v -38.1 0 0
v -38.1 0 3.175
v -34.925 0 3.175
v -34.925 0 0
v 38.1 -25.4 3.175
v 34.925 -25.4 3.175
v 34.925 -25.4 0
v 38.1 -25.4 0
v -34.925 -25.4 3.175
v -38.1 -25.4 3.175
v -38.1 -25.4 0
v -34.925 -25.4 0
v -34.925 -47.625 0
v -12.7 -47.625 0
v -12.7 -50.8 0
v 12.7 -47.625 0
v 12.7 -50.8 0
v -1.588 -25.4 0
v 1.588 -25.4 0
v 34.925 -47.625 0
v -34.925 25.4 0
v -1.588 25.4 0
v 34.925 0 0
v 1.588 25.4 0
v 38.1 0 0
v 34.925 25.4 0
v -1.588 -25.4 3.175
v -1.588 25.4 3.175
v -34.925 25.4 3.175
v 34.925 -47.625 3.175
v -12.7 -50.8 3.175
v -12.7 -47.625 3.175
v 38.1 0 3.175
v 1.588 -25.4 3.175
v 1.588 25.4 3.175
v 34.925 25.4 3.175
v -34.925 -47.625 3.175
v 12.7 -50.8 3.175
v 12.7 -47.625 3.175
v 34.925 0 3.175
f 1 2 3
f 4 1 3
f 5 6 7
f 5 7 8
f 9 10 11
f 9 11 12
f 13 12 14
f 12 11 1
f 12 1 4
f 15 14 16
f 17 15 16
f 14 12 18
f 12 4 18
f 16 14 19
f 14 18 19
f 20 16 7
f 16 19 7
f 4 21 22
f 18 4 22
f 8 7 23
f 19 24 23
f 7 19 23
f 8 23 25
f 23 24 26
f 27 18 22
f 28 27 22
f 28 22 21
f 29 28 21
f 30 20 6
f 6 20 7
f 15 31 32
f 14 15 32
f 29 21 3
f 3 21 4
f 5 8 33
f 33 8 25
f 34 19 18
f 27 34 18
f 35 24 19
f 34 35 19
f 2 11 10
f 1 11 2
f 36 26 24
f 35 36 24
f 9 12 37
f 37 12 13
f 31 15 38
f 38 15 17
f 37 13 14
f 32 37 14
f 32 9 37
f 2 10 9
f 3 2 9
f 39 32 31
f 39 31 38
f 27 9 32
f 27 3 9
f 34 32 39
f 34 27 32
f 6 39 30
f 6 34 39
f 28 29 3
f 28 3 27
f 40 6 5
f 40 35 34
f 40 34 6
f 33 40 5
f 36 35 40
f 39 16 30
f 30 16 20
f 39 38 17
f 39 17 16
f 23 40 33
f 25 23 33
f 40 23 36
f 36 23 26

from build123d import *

# Parameters (mm, degrees)
F0_W     = 3.175
F0_H     = 25.4
F0_W_2   = 25.4
F0_H_2   = 3.175
F1_DEPTH = 3.175


with BuildPart() as f1:
    # F0 (on Top) → F1 (new body)
    with BuildSketch(Plane.XY):
        Polygon((34.925, -47.625), (34.925, -25.4), (1.5875, -25.4), (-1.5875, -25.4), (-34.925, -25.4), (-34.925, -47.625), (-12.7, -47.625), (12.7, -47.625), align=None)
        Polygon((1.5875, -25.4), (34.925, -25.4), (34.925, 0), (34.925, 25.4), (1.5875, 25.4), align=None)
        with Locations((36.5125, -12.7)):
            Rectangle(F0_W, F0_H)
        Polygon((-34.925, -25.4), (-1.5875, -25.4), (-1.5875, 25.4), (-34.925, 25.4), (-34.925, 0), align=None)
        with Locations((0, -49.2125)):
            Rectangle(F0_W_2, F0_H_2)
        with Locations((-36.5125, -12.7)):
            Rectangle(F0_W, F0_H)
    extrude(amount=F1_DEPTH)


solid = f1.part
